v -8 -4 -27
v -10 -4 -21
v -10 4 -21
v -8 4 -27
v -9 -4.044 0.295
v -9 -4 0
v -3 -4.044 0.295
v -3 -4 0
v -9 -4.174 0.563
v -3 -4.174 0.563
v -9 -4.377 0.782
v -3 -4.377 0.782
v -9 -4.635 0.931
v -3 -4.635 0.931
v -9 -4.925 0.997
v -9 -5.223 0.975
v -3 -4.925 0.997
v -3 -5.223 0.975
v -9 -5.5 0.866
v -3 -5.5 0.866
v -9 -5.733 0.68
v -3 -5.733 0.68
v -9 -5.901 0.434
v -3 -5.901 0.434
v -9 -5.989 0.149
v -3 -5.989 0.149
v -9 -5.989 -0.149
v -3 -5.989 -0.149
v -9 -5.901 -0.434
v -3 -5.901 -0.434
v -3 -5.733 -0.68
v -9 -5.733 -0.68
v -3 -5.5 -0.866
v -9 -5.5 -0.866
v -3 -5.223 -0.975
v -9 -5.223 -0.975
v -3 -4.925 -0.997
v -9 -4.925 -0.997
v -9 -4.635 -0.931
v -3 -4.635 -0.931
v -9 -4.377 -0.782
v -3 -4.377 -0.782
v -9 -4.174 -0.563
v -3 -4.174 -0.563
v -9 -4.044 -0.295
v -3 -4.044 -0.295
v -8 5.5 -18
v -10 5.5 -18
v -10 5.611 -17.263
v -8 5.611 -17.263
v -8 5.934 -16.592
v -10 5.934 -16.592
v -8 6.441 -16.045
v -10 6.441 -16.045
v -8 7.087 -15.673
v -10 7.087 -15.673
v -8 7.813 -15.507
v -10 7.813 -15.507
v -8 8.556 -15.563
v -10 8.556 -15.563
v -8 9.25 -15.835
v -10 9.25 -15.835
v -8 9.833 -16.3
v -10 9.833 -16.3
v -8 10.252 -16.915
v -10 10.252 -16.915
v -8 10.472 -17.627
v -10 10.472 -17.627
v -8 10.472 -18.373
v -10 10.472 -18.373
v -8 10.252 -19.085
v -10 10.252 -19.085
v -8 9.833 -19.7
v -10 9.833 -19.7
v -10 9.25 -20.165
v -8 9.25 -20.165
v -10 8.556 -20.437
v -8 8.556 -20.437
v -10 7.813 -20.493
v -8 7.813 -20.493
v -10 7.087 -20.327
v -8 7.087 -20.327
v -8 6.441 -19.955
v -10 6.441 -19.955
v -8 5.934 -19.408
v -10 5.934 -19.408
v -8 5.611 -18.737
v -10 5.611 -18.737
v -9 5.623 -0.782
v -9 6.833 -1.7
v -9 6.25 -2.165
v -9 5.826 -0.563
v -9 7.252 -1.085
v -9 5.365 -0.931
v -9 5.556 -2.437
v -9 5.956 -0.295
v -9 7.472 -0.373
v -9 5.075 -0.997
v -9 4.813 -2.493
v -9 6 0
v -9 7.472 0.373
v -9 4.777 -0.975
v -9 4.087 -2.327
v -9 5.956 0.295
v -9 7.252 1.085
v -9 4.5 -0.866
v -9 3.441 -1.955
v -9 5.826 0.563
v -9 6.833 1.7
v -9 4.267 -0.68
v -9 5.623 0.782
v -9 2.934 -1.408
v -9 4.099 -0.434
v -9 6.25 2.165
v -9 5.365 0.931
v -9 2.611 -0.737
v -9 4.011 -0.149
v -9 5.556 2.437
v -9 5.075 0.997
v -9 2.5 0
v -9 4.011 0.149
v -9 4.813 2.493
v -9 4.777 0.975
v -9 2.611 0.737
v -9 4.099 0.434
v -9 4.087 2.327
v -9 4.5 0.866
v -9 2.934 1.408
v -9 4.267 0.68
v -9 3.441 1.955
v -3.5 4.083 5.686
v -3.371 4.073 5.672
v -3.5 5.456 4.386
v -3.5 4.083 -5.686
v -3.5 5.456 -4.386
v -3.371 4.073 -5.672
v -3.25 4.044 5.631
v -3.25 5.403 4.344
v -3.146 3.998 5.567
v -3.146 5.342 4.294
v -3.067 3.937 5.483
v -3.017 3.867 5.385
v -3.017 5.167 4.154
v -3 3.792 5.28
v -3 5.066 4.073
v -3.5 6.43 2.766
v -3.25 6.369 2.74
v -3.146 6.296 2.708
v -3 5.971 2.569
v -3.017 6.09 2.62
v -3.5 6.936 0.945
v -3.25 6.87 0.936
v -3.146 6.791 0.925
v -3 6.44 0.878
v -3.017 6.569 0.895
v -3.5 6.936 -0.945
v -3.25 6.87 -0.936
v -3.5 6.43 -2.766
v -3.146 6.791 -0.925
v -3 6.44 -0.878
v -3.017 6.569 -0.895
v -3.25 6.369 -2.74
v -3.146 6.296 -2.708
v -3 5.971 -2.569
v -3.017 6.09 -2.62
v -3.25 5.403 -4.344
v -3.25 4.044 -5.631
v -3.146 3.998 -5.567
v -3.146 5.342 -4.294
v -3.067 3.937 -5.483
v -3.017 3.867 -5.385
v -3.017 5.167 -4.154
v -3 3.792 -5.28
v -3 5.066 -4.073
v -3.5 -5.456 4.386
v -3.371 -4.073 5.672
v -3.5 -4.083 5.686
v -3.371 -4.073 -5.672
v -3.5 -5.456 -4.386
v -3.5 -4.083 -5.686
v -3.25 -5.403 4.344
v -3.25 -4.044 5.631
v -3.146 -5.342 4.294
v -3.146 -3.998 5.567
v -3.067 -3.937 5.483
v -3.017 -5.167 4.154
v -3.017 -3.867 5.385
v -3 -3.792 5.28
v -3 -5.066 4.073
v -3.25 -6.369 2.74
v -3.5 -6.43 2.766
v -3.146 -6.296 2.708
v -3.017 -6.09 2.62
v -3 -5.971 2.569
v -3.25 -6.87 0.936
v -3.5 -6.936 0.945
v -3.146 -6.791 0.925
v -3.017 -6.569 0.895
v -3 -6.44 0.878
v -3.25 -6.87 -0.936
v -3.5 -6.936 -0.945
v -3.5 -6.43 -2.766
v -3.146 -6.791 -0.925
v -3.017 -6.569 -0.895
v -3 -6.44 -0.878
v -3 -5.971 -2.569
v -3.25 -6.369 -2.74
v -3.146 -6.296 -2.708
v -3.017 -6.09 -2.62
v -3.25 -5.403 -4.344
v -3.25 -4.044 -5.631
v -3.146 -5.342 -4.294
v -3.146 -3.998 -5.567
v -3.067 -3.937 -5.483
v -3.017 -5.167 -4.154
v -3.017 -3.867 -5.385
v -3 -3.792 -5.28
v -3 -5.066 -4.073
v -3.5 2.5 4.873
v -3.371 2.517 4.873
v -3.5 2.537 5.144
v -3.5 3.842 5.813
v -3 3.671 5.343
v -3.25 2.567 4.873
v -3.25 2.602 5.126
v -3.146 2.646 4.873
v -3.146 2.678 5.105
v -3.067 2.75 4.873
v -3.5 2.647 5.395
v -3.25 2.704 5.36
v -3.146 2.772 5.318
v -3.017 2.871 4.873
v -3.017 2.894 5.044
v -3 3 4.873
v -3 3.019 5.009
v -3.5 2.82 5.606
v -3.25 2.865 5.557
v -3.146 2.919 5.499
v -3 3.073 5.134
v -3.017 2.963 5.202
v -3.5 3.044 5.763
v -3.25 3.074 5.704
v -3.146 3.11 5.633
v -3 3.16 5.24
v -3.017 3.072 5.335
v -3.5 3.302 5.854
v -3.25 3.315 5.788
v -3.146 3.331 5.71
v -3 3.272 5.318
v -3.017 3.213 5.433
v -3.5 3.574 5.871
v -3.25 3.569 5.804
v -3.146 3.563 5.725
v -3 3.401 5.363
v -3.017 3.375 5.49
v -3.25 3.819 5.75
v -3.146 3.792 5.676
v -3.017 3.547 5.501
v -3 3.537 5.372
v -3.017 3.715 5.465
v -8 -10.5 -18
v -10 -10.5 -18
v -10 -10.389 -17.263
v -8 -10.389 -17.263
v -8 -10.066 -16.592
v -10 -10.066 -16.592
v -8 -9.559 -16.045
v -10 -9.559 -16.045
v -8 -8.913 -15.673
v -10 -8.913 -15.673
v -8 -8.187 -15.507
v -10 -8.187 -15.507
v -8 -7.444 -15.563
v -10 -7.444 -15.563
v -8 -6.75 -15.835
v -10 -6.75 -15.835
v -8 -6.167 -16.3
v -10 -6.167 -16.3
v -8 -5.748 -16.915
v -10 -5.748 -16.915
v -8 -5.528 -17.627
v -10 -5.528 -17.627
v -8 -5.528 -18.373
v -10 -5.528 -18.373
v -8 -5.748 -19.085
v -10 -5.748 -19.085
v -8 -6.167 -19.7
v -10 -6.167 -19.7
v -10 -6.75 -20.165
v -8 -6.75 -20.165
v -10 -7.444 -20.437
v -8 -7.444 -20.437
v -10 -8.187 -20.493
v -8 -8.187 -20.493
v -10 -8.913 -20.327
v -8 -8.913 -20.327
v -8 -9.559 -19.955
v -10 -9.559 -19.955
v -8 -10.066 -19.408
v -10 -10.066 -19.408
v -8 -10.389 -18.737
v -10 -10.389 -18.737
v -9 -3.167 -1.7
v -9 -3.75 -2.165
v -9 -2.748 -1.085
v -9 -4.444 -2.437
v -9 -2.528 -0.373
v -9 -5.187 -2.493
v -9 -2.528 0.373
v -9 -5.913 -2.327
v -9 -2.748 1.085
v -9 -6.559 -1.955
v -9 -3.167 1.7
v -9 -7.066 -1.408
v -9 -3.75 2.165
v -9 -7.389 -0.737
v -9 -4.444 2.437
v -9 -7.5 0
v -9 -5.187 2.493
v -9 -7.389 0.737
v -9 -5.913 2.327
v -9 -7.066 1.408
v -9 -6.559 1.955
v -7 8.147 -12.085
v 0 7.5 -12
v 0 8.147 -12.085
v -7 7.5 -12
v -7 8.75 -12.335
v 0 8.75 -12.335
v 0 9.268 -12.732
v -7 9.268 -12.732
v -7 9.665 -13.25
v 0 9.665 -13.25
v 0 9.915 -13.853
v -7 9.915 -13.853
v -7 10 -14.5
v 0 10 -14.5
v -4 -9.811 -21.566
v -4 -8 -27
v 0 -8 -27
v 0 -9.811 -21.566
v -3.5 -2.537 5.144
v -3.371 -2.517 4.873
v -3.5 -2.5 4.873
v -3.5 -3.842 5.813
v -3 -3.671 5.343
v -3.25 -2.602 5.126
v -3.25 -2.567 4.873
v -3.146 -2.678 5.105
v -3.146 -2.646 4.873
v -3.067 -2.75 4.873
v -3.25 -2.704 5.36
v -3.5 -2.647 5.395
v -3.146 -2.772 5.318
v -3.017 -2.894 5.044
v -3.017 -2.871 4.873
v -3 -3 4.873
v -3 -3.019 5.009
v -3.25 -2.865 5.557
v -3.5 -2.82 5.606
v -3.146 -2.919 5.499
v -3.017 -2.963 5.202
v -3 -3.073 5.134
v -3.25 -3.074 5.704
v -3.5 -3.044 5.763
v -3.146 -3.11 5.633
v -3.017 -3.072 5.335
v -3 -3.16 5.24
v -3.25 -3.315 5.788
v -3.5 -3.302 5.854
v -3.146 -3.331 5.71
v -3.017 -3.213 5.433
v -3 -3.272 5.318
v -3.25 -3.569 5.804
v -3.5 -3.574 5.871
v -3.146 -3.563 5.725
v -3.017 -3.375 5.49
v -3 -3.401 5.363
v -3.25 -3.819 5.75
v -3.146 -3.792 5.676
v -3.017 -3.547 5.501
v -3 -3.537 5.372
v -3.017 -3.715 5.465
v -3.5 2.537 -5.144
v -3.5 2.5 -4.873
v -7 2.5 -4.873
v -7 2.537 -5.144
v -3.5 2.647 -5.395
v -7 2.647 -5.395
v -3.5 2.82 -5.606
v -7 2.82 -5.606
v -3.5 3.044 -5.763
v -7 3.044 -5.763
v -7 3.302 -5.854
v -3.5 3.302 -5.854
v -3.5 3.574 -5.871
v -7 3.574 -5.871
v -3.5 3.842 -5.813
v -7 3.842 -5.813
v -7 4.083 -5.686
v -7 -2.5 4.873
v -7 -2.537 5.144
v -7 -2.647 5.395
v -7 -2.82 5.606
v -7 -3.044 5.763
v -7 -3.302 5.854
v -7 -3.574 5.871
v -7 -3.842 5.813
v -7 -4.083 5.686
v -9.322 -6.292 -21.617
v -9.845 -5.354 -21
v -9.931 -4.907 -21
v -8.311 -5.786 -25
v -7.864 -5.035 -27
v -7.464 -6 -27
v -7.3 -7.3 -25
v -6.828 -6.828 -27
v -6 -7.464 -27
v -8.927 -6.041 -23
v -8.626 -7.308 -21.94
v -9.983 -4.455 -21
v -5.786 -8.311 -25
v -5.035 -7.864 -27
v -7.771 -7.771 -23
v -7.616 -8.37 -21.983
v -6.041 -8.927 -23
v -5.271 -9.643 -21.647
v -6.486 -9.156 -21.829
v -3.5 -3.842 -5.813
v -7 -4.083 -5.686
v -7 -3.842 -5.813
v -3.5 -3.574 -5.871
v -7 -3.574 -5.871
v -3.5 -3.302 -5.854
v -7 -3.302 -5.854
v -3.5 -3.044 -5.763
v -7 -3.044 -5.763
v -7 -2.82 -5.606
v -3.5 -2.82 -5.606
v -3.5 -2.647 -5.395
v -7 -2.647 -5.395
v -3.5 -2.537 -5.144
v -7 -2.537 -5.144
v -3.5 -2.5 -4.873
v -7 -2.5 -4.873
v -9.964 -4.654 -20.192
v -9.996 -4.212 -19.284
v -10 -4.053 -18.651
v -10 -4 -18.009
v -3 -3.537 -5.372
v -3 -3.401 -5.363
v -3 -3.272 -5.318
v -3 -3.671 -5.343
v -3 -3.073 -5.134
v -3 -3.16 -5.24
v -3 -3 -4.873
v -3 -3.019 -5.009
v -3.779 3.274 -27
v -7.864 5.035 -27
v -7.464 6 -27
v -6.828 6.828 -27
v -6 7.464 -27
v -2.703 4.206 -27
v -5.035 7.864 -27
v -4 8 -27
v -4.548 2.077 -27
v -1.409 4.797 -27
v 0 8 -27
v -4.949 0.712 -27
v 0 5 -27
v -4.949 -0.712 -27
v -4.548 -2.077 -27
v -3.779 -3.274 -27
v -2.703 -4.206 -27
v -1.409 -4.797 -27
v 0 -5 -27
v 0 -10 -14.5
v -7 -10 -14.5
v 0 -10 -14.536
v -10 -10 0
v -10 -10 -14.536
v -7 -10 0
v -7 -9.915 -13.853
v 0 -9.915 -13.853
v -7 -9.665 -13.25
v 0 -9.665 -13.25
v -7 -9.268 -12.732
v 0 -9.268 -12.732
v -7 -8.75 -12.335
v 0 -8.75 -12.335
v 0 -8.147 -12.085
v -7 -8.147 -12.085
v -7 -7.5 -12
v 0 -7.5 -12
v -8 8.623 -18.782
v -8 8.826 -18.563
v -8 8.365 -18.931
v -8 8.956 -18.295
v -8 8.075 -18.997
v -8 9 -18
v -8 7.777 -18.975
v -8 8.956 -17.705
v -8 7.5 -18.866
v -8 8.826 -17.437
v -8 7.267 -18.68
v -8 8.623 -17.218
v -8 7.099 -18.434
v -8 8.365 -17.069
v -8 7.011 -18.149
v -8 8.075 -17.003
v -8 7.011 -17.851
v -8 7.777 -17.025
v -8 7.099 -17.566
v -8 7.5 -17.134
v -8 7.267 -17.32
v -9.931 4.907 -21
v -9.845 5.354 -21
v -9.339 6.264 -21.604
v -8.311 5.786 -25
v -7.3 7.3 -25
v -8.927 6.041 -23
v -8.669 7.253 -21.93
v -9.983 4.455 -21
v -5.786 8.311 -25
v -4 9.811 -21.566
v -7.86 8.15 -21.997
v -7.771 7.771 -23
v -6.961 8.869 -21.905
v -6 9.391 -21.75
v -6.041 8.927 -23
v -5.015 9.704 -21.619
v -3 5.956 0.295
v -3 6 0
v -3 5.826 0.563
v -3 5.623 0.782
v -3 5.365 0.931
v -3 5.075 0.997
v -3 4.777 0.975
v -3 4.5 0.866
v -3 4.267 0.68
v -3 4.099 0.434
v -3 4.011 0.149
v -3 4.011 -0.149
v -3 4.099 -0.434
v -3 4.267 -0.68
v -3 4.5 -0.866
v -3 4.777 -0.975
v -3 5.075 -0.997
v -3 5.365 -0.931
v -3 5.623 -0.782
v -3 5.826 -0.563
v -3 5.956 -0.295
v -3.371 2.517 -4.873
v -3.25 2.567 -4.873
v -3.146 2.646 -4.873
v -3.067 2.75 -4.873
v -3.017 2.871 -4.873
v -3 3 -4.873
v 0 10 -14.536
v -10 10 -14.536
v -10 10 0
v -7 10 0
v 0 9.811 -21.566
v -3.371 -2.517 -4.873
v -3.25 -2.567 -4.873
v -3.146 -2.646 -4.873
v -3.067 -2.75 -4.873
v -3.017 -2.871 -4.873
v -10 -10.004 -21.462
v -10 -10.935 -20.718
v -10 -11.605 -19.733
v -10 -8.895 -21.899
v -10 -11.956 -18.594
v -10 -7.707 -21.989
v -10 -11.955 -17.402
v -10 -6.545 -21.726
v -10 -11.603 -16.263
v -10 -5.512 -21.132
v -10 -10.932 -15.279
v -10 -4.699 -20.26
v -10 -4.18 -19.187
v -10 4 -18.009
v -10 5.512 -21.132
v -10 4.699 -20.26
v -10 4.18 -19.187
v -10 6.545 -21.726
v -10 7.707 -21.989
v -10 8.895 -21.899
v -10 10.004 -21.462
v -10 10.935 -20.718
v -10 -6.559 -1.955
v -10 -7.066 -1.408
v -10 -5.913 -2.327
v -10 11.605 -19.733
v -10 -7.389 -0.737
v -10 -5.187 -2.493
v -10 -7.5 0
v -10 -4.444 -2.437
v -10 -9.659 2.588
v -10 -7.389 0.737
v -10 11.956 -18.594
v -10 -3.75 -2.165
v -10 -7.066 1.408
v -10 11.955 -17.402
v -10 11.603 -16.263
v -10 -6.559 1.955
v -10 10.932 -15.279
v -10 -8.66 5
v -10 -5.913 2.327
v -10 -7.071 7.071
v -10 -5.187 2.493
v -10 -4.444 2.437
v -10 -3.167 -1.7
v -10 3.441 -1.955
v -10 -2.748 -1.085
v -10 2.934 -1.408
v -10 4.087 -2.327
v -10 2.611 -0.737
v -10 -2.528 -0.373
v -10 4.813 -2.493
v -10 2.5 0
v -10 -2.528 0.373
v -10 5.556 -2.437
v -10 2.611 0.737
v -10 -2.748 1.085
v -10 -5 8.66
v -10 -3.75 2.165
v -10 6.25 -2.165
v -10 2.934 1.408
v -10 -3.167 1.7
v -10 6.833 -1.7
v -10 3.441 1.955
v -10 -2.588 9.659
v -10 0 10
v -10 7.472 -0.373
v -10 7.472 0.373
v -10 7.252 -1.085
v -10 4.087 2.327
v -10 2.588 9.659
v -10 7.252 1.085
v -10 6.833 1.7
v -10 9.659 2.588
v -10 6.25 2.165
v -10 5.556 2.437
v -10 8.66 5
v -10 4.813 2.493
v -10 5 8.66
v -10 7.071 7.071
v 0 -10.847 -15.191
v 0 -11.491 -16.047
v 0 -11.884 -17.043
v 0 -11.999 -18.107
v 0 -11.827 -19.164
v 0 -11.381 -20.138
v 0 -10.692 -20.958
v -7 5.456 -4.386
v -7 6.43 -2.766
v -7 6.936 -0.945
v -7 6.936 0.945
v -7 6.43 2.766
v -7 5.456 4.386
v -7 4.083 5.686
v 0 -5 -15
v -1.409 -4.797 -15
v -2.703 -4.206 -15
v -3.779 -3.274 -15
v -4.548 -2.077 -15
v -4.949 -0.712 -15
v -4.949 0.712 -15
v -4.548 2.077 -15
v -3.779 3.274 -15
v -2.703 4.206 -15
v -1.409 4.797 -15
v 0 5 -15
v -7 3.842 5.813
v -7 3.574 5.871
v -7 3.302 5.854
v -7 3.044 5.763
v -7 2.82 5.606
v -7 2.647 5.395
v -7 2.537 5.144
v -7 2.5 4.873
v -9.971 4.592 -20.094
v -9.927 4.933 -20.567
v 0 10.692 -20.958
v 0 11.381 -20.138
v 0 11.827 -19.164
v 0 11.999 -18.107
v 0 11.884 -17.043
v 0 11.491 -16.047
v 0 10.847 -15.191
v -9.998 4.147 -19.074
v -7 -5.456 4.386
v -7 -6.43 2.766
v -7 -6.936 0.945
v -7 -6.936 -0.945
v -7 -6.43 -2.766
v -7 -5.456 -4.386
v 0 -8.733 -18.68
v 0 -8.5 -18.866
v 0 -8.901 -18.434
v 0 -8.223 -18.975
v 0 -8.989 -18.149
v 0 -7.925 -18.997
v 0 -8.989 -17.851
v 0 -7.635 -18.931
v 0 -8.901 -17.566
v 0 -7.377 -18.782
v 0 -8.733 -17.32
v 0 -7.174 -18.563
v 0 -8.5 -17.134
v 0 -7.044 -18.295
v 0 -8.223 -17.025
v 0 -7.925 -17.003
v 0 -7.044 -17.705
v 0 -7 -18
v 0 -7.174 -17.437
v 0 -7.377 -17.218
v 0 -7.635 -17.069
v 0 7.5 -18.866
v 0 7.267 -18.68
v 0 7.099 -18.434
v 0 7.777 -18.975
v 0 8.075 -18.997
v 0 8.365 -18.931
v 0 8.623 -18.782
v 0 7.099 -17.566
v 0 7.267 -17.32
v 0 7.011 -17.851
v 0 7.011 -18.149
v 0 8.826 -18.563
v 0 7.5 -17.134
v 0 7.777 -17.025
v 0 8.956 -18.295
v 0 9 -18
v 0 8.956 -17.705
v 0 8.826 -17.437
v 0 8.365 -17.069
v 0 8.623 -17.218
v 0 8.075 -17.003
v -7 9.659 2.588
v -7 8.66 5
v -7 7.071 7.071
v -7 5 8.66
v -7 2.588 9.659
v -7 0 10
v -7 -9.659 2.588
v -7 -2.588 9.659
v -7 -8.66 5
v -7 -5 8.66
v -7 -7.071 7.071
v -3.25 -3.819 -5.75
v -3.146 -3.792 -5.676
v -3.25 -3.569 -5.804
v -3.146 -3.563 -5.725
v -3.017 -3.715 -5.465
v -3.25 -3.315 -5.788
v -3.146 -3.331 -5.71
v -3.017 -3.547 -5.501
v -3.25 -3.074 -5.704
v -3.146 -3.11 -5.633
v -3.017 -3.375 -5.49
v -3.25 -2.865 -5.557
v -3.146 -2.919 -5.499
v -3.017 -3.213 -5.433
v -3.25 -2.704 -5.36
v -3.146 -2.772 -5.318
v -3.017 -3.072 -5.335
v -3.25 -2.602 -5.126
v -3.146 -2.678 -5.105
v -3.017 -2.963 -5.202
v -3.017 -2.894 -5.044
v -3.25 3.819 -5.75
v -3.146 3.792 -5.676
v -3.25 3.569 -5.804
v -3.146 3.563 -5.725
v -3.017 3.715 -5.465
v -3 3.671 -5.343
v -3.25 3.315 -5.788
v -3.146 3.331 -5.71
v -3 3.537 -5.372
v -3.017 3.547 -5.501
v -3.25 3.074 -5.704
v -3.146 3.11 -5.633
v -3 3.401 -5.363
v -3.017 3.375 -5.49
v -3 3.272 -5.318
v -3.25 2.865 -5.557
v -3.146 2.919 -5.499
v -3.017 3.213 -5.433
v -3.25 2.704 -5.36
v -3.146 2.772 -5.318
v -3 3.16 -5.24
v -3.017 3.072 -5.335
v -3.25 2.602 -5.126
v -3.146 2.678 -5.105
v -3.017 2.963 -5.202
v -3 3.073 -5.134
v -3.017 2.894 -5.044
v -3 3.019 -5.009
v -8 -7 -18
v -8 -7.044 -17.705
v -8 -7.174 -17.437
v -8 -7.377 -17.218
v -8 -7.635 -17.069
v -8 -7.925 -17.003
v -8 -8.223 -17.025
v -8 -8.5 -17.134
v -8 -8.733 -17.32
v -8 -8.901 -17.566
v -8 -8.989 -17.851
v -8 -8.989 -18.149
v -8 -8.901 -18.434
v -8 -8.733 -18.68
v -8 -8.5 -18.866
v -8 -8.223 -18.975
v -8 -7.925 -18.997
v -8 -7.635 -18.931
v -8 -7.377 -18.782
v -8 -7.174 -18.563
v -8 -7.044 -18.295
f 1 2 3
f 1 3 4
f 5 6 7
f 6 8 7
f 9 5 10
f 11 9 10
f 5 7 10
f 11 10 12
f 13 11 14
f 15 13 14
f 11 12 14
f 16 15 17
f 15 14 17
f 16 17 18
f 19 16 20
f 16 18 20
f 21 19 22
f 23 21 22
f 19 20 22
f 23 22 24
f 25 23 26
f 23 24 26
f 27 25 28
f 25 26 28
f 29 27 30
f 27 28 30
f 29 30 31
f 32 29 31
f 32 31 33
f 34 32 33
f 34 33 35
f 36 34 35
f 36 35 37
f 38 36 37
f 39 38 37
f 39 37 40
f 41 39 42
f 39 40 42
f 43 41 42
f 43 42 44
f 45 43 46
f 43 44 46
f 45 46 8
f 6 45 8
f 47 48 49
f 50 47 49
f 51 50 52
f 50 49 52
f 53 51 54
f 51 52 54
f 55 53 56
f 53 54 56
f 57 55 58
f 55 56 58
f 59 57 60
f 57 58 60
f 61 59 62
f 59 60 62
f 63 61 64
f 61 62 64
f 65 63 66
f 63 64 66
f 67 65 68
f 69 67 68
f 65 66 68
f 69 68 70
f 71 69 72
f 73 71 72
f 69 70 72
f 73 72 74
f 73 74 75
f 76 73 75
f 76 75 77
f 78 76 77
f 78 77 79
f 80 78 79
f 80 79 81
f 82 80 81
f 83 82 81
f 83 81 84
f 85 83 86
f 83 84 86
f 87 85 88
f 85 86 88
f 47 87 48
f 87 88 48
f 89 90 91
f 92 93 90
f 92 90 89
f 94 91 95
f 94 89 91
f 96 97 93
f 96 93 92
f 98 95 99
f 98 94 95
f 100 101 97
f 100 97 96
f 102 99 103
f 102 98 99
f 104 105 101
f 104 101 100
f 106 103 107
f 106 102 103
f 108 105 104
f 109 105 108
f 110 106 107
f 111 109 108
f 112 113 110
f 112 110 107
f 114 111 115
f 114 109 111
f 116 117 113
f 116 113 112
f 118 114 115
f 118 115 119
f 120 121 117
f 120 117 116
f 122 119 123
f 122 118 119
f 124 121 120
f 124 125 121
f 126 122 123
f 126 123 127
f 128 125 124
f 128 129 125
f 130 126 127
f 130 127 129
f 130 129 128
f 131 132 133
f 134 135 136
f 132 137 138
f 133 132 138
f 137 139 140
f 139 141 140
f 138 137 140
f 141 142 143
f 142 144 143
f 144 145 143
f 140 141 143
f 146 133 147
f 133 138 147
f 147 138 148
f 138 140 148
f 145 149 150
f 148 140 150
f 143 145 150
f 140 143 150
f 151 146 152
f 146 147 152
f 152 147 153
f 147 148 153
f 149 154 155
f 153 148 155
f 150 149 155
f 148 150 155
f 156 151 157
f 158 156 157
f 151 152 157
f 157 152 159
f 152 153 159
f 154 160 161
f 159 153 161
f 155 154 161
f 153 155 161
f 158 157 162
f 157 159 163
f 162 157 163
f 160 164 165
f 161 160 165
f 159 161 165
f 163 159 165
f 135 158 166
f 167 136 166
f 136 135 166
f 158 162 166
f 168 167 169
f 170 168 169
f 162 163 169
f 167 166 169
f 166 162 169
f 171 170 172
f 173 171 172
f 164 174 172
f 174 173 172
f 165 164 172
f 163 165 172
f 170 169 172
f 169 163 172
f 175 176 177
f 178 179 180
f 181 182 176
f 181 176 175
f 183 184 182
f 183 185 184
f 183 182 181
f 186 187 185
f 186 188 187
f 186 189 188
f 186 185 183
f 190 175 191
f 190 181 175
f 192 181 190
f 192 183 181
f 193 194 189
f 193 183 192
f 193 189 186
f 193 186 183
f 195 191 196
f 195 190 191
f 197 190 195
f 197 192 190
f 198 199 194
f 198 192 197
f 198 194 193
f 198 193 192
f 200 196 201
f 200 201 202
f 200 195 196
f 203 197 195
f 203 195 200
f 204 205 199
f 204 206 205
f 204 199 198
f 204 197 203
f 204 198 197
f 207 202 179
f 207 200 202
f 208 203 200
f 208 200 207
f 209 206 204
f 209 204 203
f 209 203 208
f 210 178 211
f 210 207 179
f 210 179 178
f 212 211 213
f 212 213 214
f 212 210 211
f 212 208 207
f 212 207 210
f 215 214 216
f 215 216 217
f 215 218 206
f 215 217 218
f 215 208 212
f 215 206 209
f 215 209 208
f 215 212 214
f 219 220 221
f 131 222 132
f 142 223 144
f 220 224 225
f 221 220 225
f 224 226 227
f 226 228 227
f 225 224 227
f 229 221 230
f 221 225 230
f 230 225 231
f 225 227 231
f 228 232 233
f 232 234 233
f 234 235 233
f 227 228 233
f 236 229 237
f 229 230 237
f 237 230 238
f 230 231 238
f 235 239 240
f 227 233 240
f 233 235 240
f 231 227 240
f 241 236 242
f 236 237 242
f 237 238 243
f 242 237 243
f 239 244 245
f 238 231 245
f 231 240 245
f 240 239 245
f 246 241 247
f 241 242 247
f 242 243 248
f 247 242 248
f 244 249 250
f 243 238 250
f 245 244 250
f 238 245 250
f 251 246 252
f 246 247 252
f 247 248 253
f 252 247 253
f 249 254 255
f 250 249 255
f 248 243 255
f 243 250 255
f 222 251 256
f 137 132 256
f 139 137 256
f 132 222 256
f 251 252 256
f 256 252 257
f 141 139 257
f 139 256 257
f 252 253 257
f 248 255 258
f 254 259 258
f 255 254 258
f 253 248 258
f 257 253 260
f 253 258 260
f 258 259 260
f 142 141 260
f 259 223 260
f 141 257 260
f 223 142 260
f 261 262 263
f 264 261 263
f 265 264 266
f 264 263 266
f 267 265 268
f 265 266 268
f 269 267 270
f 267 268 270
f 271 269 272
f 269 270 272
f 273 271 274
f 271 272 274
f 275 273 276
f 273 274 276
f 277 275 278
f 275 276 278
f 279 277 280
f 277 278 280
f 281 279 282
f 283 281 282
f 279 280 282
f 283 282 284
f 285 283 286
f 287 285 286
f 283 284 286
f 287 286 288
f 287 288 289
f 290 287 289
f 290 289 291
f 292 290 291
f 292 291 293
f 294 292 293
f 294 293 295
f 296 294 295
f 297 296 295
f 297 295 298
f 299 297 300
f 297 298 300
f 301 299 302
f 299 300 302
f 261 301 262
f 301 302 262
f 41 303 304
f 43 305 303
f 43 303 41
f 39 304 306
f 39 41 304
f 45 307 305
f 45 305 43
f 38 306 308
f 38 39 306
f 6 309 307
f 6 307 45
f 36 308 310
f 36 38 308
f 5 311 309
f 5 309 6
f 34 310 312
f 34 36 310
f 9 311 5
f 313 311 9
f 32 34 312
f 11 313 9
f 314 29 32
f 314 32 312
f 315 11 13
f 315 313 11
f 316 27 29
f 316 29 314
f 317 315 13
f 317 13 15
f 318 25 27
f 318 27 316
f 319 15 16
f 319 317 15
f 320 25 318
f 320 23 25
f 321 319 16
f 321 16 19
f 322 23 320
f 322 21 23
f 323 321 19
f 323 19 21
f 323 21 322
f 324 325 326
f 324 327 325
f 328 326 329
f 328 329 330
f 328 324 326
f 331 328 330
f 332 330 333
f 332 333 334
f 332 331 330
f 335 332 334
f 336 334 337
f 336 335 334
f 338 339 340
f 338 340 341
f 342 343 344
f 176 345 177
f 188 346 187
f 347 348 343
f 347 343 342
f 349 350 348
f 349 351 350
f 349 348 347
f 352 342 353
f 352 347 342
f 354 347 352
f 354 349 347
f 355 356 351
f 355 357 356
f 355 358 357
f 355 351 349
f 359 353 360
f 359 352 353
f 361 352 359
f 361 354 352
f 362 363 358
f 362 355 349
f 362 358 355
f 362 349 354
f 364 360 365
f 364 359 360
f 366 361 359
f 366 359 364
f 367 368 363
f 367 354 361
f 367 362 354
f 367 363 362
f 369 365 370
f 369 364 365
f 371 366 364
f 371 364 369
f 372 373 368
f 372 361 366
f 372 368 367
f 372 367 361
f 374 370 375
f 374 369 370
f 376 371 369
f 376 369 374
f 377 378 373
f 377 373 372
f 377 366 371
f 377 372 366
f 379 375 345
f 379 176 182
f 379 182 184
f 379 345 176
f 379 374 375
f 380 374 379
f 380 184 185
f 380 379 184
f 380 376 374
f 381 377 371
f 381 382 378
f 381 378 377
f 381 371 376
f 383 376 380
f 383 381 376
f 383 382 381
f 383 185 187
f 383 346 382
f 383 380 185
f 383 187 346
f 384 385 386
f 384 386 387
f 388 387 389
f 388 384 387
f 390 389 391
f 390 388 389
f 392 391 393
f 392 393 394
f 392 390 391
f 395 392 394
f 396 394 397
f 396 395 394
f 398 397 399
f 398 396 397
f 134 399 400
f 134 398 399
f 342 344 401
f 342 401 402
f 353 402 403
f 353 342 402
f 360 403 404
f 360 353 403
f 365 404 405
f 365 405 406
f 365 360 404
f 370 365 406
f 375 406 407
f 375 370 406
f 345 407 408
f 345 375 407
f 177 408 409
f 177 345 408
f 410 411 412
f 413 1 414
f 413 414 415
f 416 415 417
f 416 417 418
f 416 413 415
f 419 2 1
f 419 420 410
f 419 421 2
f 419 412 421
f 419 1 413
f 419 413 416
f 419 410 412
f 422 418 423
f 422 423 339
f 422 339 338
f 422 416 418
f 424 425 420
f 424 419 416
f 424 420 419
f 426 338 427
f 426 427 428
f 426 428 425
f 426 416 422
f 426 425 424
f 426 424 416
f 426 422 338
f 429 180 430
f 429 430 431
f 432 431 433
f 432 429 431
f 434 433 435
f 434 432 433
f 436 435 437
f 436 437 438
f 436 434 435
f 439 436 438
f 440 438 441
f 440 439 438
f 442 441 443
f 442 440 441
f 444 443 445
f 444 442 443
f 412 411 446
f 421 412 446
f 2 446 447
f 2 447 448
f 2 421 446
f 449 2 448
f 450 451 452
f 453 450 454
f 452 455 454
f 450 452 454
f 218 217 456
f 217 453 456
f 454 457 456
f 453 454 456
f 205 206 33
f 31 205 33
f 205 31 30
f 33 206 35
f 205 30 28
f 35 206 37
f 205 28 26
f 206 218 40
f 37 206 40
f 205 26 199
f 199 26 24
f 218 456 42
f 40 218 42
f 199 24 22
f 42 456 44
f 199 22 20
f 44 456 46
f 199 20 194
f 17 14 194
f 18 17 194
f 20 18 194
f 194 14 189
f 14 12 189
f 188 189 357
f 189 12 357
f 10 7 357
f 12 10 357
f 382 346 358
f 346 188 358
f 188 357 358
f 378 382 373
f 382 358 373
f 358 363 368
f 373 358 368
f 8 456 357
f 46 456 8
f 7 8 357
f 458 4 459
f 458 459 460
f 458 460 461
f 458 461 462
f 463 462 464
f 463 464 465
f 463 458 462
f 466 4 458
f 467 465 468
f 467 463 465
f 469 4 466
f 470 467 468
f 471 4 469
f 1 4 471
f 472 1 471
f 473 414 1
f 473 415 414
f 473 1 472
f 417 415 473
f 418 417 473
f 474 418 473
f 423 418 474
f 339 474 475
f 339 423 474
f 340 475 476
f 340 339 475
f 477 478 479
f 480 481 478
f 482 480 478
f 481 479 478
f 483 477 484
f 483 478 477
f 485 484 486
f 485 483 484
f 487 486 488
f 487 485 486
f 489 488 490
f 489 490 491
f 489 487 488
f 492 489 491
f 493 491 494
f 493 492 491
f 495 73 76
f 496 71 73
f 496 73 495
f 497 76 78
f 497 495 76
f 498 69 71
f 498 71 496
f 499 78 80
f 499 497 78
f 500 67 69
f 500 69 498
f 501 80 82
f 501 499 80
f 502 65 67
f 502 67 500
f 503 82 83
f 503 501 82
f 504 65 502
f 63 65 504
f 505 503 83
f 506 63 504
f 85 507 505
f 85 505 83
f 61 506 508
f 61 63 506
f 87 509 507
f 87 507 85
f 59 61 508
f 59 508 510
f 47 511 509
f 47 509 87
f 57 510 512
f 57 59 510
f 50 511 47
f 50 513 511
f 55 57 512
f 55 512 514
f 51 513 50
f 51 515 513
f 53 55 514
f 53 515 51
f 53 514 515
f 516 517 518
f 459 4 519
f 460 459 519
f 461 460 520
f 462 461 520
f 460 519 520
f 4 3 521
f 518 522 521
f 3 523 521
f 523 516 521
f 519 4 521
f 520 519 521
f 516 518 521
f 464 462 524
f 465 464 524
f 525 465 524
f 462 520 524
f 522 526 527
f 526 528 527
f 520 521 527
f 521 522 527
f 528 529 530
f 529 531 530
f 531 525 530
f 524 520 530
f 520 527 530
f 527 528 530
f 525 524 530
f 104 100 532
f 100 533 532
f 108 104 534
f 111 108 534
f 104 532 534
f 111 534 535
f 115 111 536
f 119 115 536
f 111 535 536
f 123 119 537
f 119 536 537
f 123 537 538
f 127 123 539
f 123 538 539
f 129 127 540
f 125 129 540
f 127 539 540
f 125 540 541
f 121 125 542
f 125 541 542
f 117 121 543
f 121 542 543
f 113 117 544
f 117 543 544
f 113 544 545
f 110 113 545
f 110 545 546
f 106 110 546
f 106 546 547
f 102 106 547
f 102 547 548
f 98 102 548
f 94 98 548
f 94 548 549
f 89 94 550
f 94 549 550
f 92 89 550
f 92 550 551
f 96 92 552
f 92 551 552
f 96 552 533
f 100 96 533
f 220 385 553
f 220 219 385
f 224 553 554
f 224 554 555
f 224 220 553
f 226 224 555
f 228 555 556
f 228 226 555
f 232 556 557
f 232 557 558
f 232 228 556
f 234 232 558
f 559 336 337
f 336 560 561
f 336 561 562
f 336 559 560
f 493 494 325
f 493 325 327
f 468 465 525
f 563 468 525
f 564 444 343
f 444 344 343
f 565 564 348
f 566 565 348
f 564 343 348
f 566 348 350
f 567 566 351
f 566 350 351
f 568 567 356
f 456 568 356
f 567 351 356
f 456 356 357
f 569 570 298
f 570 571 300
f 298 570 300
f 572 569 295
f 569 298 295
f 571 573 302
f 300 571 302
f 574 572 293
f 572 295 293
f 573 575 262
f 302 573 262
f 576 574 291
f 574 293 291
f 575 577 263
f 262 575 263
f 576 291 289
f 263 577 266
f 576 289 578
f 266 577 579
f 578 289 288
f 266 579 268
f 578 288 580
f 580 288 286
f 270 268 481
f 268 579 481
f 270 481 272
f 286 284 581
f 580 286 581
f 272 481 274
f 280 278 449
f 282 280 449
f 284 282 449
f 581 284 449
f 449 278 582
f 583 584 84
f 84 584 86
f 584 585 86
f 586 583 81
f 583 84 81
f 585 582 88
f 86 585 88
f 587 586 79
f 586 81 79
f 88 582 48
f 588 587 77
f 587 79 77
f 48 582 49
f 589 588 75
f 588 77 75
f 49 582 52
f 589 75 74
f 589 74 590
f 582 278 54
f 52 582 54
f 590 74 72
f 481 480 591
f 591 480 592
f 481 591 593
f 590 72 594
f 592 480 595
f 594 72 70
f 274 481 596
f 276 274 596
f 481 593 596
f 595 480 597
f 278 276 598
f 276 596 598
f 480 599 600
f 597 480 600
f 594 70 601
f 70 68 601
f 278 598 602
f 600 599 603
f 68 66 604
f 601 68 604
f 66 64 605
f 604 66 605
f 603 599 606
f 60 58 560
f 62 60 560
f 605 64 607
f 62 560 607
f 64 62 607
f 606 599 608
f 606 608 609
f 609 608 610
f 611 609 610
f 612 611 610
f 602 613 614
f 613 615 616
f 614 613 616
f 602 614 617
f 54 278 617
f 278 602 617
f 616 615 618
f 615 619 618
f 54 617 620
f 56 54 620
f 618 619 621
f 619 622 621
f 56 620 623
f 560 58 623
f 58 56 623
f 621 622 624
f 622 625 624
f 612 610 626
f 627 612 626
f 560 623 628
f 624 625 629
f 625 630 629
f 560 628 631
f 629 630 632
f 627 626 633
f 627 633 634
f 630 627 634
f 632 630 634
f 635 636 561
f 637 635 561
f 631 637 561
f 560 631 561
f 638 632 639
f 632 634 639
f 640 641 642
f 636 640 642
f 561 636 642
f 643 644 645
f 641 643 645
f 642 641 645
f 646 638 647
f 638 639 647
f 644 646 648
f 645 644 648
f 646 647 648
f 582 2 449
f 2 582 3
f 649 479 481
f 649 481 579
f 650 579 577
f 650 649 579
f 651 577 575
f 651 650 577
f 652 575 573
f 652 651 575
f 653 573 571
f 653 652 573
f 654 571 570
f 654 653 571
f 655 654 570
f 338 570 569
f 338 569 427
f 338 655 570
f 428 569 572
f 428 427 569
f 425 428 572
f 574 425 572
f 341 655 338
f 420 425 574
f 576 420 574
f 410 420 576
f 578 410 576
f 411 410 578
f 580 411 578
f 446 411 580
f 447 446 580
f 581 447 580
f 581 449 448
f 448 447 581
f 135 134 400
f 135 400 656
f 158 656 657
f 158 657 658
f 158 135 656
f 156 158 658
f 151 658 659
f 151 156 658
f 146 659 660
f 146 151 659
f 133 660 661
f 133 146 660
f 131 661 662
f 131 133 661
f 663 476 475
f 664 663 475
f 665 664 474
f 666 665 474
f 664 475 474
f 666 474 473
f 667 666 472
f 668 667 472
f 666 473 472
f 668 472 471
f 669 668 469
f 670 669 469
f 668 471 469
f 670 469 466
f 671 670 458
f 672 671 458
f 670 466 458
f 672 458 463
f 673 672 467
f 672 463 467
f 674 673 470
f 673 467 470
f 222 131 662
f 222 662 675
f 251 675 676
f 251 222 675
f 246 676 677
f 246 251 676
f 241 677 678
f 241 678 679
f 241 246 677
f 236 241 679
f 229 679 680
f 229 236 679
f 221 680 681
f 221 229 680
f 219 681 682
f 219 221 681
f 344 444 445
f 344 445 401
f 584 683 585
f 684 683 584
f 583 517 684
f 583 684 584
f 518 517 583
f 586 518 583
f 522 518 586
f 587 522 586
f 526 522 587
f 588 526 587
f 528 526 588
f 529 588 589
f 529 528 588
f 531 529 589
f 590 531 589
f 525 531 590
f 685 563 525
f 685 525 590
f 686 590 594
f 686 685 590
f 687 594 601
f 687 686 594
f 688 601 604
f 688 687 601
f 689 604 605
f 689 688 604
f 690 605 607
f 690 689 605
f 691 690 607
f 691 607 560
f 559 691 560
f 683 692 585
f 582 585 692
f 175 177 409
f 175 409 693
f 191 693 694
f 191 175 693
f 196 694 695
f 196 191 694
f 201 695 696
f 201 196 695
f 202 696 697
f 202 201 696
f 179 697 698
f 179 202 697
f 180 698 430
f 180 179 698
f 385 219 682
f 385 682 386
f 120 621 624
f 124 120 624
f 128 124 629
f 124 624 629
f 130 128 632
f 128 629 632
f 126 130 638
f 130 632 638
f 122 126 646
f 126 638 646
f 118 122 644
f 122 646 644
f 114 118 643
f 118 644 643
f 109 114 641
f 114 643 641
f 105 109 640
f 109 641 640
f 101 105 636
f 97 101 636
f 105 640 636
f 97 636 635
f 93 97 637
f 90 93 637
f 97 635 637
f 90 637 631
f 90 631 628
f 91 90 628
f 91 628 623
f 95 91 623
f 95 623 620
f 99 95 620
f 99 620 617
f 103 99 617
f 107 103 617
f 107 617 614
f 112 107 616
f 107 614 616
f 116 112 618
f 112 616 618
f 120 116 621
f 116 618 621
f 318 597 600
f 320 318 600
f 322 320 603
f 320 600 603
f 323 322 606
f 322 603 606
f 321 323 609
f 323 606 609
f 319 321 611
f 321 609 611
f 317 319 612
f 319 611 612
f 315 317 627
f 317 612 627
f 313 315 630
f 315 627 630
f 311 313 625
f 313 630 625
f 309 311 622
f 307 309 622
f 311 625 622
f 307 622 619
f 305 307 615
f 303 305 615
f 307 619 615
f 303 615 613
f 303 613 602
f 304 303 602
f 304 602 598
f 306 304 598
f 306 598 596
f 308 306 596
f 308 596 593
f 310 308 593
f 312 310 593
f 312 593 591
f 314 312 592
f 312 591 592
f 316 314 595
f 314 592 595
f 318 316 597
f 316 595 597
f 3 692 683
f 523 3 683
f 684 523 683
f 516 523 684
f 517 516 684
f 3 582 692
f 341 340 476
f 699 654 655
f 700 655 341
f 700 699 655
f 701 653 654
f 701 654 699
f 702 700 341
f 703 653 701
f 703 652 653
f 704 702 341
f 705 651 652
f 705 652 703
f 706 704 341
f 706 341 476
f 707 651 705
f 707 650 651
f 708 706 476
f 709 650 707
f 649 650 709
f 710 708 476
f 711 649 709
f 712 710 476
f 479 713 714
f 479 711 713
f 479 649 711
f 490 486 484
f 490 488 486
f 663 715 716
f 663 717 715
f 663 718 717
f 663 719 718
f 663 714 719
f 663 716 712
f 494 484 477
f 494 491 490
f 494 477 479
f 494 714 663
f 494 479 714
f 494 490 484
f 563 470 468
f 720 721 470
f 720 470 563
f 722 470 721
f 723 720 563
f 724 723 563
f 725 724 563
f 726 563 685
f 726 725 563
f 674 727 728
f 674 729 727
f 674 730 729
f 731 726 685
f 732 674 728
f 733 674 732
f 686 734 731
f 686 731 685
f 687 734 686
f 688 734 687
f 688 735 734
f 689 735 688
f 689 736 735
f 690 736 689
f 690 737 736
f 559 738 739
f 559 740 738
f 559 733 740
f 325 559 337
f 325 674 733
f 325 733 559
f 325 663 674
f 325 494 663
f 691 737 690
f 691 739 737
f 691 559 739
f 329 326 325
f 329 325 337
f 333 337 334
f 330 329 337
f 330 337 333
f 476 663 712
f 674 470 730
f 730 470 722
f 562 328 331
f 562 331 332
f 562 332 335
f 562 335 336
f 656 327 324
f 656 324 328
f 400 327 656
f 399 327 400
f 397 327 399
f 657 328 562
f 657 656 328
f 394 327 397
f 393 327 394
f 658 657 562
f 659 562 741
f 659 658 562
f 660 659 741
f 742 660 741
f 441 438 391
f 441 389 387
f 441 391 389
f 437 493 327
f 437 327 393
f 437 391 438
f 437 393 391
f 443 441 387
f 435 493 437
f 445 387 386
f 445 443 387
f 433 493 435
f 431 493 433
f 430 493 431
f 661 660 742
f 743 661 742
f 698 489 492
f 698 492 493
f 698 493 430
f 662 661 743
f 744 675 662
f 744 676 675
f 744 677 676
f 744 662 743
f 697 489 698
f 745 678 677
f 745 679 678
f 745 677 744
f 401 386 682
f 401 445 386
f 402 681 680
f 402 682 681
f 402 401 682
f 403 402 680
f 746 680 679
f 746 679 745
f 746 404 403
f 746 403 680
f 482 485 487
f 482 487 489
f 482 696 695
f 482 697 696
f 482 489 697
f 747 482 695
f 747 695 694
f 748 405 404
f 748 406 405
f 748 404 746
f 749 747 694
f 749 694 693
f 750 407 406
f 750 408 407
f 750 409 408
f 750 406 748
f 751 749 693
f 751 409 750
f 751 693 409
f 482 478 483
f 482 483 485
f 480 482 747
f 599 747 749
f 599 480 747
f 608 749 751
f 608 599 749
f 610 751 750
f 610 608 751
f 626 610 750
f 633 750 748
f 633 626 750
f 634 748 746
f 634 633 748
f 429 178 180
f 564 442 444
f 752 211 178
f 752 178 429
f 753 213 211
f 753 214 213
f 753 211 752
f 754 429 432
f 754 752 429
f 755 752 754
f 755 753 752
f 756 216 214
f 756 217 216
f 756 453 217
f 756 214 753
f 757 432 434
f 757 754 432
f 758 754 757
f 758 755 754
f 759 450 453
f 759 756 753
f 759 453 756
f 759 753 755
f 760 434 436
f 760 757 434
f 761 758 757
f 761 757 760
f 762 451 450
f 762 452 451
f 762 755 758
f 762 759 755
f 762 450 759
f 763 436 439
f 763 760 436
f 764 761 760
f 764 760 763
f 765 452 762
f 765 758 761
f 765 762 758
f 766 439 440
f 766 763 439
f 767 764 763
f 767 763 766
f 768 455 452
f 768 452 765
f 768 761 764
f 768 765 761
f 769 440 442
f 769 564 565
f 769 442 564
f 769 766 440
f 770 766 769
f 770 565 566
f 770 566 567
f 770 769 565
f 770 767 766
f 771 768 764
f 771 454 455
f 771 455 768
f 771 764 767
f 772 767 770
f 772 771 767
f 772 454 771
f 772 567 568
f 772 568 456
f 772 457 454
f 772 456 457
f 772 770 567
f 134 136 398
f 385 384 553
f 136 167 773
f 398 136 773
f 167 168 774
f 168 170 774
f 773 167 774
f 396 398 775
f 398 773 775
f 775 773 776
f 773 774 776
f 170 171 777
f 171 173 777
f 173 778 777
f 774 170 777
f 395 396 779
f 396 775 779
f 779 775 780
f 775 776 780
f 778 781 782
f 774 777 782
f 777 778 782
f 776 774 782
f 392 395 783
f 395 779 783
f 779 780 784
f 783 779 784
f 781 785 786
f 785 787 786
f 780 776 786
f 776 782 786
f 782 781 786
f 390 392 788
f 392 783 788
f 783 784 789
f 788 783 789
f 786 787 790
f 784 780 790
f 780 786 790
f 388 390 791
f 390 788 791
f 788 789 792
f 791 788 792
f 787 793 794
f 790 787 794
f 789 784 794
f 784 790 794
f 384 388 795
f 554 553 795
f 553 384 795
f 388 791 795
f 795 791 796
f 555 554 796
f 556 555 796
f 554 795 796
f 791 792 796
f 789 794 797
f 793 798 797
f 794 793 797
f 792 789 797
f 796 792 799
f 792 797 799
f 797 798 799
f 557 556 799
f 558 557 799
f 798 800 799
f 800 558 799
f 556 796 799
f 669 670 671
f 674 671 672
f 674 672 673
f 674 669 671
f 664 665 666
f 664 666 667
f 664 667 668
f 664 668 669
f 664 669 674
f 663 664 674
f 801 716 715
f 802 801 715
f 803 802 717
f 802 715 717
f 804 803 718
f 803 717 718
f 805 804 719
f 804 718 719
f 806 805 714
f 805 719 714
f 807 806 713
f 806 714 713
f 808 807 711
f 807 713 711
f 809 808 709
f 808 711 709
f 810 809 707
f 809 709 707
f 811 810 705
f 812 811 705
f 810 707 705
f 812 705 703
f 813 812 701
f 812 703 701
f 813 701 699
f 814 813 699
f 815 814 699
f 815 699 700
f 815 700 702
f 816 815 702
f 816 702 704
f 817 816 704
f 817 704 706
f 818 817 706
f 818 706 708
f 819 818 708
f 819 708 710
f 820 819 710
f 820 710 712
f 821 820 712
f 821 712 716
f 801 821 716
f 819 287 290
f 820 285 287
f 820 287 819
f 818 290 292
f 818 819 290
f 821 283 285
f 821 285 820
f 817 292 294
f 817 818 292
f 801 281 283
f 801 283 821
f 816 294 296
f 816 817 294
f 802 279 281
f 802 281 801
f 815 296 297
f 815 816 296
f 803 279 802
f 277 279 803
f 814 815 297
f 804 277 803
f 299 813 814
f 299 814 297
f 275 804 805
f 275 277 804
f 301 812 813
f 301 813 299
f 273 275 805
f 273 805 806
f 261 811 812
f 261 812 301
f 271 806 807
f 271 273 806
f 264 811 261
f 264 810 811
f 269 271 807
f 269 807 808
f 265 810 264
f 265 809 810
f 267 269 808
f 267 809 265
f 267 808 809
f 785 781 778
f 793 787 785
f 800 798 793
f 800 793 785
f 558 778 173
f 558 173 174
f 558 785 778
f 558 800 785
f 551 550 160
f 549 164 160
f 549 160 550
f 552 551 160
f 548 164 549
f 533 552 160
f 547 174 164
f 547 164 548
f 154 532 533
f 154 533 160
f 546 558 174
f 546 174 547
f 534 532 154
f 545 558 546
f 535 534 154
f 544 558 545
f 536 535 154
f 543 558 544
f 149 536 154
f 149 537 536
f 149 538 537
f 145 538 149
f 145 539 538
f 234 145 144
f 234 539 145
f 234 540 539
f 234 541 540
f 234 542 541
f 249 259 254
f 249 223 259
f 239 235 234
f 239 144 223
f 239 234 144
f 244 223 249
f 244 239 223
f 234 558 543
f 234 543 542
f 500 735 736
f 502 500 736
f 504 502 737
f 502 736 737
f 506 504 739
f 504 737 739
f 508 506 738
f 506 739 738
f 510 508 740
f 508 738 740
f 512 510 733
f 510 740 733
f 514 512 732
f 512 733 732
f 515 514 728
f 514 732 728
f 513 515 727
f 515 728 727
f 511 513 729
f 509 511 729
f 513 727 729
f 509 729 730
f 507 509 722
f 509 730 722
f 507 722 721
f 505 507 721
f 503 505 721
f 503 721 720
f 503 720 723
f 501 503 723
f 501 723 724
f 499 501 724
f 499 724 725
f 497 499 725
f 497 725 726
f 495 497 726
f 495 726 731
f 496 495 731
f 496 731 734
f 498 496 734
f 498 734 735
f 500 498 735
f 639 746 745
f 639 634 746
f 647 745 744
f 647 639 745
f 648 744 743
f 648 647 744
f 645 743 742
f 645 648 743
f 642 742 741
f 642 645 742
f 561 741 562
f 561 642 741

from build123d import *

# Parameters (mm, degrees)
F0_R          = 1
F2_DEPTH      = 7
F3_DEPTH      = 10
F3_DEPTH_BACK = 10
F4_W          = 3
F4_H          = 15
F5_DEPTH      = 10
F5_DEPTH_BACK = 10
F6_R          = 0.5
F7_DEPTH      = 25
F8_R          = 4
F8_R_2        = 2.5
F8_R_3        = 1
F9_DEPTH      = 10
F11_DEPTH     = 12
F12_R         = 2.5
F13_DEPTH     = 2
F14_DEPTH     = 25
F15_R         = 5.99999
F16_T1_DEPTH  = 8.00002
F16_T6_ANGLE  = 90
F16_S7_R      = 4
F16_T8_DEPTH  = 7
F16_T12_ANGLE = 90
F16_S13_R     = 4
F16_T14_DEPTH = 7
F16_T18_DEPTH = 19.5703760639
F16_S19_R     = 4
F16_T20_DEPTH = 12
F16_T24_DEPTH = 19.5703760639
F16_S25_R     = 4
F16_T26_DEPTH = 12
F17_R         = 9.99999
F18_R         = 2.5
F18_R_2       = 1
F19_DEPTH     = 1
F20_R         = 2.5


# Not quite as in the source:
# - a fillet or chamfer that OpenCascade refuses, or shapes differently, is made with other operations: its cross-section is extruded or revolved along the edge and cut away or added
# - a fillet or chamfer is up to 0.001 mm smaller than in the source, because OpenCascade refuses the exact size


with BuildPart() as f2:
    # F0 (on Right) → F2 (new body)
    with BuildSketch(Plane.YZ):
        with BuildLine():
            ThreePointArc((-2.5, 4.8733971724), (-3.0435645354, 5.7631536934), (-4.0833333333, 5.6856300345))
            ThreePointArc((-4.0833333333, 5.6856300345), (-7, 0), (-4.0833333333, -5.6856300345))
            ThreePointArc((-4.0833333333, -5.6856300345), (-3.0435645354, -5.7631536934), (-2.5, -4.8733971724))
            Line((-2.5, -4.8733971724), (-2.5, 0))
            Line((-2.5, 0), (-2.5, 4.8733971724))
        make_face()
        with Locations((-5, 0)):
            Circle(F0_R, mode=Mode.SUBTRACT)
    extrude(amount=-F2_DEPTH)



with BuildPart() as f2b:
    # F0 (on Right) → F2, piece 2 (new body)
    with BuildSketch(Plane.YZ):
        with BuildLine():
            Line((2.5, 4.8733971724), (2.5, 0))
            Line((2.5, 0), (2.5, -4.8733971724))
            ThreePointArc((2.5, -4.8733971724), (3.0435645354, -5.7631536934), (4.0833333333, -5.6856300345))
            ThreePointArc((4.0833333333, -5.6856300345), (7, 0), (4.0833333333, 5.6856300345))
            ThreePointArc((4.0833333333, 5.6856300345), (3.0435645354, 5.7631536934), (2.5, 4.8733971724))
        make_face()
        with Locations((5, 0)):
            Circle(F0_R, mode=Mode.SUBTRACT)
    extrude(amount=-F2_DEPTH)


with BuildPart() as f2_1:
    add(f2.part)

    add(f2b.part)  # F3 merges F2b
    # F1 (on Front) → F3 (join, two sides)
    with BuildSketch(Plane.XZ) as f3_sk:
        Polygon((0, -12), (-7, -12), (-7, 10), (-10, 10), (-10, -27), (0, -27), align=None)
    extrude(amount=F3_DEPTH)
    extrude(f3_sk.sketch, amount=-F3_DEPTH_BACK)

    # F4 (on Front) → F5 (cut, two sides)
    with BuildSketch(Plane.XZ) as f5_sk:
        with Locations((-1.5, 0)):
            Rectangle(F4_W, F4_H)
    extrude(amount=-F5_DEPTH, mode=Mode.SUBTRACT)
    extrude(f5_sk.sketch, amount=F5_DEPTH_BACK, mode=Mode.SUBTRACT)

    # F6
    f6_edges = [f2_1.edges().sort_by_distance(p)[0] for p in [
        (-3, -7, 0),
        (-3, 2.5, 0),
        (-3, -3.043565, 5.763154),
        (-3, -3.043565, -5.763154),
        (-3, -2.5, 0),
        (-3, 7, 0),
        (-3, 3.043565, -5.763154),
        (-3, 3.043565, 5.763154),
    ]]
    fillet(f6_edges, radius=F6_R)

    # F0 (on Right) → F7 (cut)
    with BuildSketch(Plane.YZ):
        with Locations((-8, -18)):
            Circle(F0_R)
        with Locations((8, -18)):
            Circle(F0_R)
    extrude(amount=-F7_DEPTH, mode=Mode.SUBTRACT)

    # F8 (on Right) → F9 (join)
    with BuildSketch(Plane.YZ):
        with Locations((8, -18)):
            Circle(F8_R)
        with Locations((8, -18)):
            Circle(F8_R_2, mode=Mode.SUBTRACT)
        with Locations((-8, -18)):
            Circle(F8_R)
        with Locations((-8, -18)):
            Circle(F8_R_2, mode=Mode.SUBTRACT)
        with Locations((8, -18)):
            Circle(F8_R_2)
        with Locations((8, -18)):
            Circle(F8_R_3, mode=Mode.SUBTRACT)
        with Locations((-8, -18)):
            Circle(F8_R_2)
        with Locations((-8, -18)):
            Circle(F8_R_3, mode=Mode.SUBTRACT)
    extrude(amount=-F9_DEPTH)

    # F10 (on face) → F11 (cut)
    with BuildSketch(Plane(origin=(0, 0, -27), x_dir=(1, 0, 0), z_dir=(0, 0, -1))):
        with BuildLine():
            Line((0, -5), (0, 5))
            ThreePointArc((0, 5), (-5, 0), (0, -5))
        make_face()
    extrude(amount=-F11_DEPTH, mode=Mode.SUBTRACT)

    # F12 (on face) → F13 (cut)
    with BuildSketch(Plane(origin=(-10, 0, 0), x_dir=(0, -1, 0), z_dir=(-1, 0, 0))):
        with Locations((-8, -18)):
            Circle(F12_R)
        with Locations((8, -18)):
            Circle(F12_R)
    extrude(amount=-F13_DEPTH, mode=Mode.SUBTRACT)

    # F0 (on Right) → F14 (cut)
    with BuildSketch(Plane.YZ):
        with Locations((-5, 0)):
            Circle(F0_R)
        with Locations((5, 0)):
            Circle(F0_R)
    extrude(amount=-F14_DEPTH, mode=Mode.SUBTRACT)

    # F15 (radius 6 in the source; OpenCascade refuses exactly that, so slightly less here)
    f15_edges = [f2_1.edges().sort_by_distance(p)[0] for p in [
        (-10, 10, -24.232051),
        (-10, -10, -24.232051),
    ]]
    fillet(f15_edges, radius=F15_R)

    # F16: chamfer of 2 x 6 on 5 edges, made by hand

    # F16_s2 → F16_t1 (cut)
    with BuildSketch(Plane.XZ.offset(-4.00001)):
        Polygon((-10, -21), (-8, -27), (-10, -27), align=None)
    extrude(amount=F16_T1_DEPTH, mode=Mode.SUBTRACT)


with BuildPart() as f16_tool4:
    # F16_s5 → F16_t6 (revolve)
    with BuildSketch(Plane.XZ.offset(-4.00001)):
        Polygon((-8, -27), (-10, -21), (-10, -27), align=None)
    revolve(axis=Axis((-4.00001, 4.00001, -27), (0, 0, -1)), revolution_arc=F16_T6_ANGLE)

    # F16_s7 → F16_t8 (cut, symmetric)
    with BuildSketch(Plane.YZ.offset(-7)):
        with Locations((8, -18)):
            Circle(F16_S7_R)
    extrude(amount=F16_T8_DEPTH, both=True, mode=Mode.SUBTRACT)


with BuildPart() as f2_2:
    add(f2_1.part)

    # F16_t3: cut F16_tool4
    add(f16_tool4.part, mode=Mode.SUBTRACT)


with BuildPart() as f16_tool10:
    # F16_s11 → F16_t12 (revolve)
    with BuildSketch(Plane.XZ.offset(4.00001)):
        Polygon((-8, -27), (-10, -21), (-10, -27), align=None)
    revolve(axis=Axis((-4.00001, -4.00001, -27), (0, 0, 1)), revolution_arc=F16_T12_ANGLE)

    # F16_s13 → F16_t14 (cut, symmetric)
    with BuildSketch(Plane.YZ.offset(-7)):
        with Locations((-8, -18)):
            Circle(F16_S13_R)
    extrude(amount=F16_T14_DEPTH, both=True, mode=Mode.SUBTRACT)


with BuildPart() as f2_3:
    add(f2_2.part)

    # F16_t9: cut F16_tool10
    add(f16_tool10.part, mode=Mode.SUBTRACT)


with BuildPart() as f16_tool16:
    # F16_s17 → F16_t18 (new body)
    with BuildSketch(Plane.YZ.offset(-4.00001)):
        Polygon((-8, -27), (-10, -21), (-10, -27), align=None)
    extrude(amount=F16_T18_DEPTH)

    # F16_s19 → F16_t20 (cut, symmetric)
    with BuildSketch(Plane.YZ.offset(5.8)):
        with Locations((-8, -18)):
            Circle(F16_S19_R)
    extrude(amount=F16_T20_DEPTH, both=True, mode=Mode.SUBTRACT)


with BuildPart() as f2_4:
    add(f2_3.part)

    # F16_t15: cut F16_tool16
    add(f16_tool16.part, mode=Mode.SUBTRACT)


with BuildPart() as f16_tool22:
    # F16_s23 → F16_t24 (new body)
    with BuildSketch(Plane.YZ.offset(-4.00001)):
        Polygon((8, -27), (10, -21), (10, -27), align=None)
    extrude(amount=F16_T24_DEPTH)

    # F16_s25 → F16_t26 (cut, symmetric)
    with BuildSketch(Plane.YZ.offset(5.8)):
        with Locations((8, -18)):
            Circle(F16_S25_R)
    extrude(amount=F16_T26_DEPTH, both=True, mode=Mode.SUBTRACT)


with BuildPart() as f2_5:
    add(f2_4.part)

    # F16_t21: cut F16_tool22
    add(f16_tool22.part, mode=Mode.SUBTRACT)

    # F17 (radius 10 in the source; OpenCascade refuses exactly that, so slightly less here)
    f17_edges = [f2_5.edges().sort_by_distance(p)[0] for p in [
        (-8.5, -10, 10),
        (-8.5, 10, 10),
    ]]
    fillet(f17_edges, radius=F17_R)

    # F18 (on face) → F19 (cut)
    with BuildSketch(Plane(origin=(-10, 0, 0), x_dir=(0, -1, 0), z_dir=(-1, 0, 0))):
        with Locations((-5, 0)):
            Circle(F18_R)
        with Locations((-5, 0)):
            Circle(F18_R_2, mode=Mode.SUBTRACT)
        with Locations((5, 0)):
            Circle(F18_R)
        with Locations((5, 0)):
            Circle(F18_R_2, mode=Mode.SUBTRACT)
    extrude(amount=-F19_DEPTH, mode=Mode.SUBTRACT)

    # F20
    f20_edges = [f2_5.edges().sort_by_distance(p)[0] for p in [
        (-3.5, 10, -12),
        (-3.5, -10, -12),
    ]]
    fillet(f20_edges, radius=F20_R)


solid = f2_5.part
